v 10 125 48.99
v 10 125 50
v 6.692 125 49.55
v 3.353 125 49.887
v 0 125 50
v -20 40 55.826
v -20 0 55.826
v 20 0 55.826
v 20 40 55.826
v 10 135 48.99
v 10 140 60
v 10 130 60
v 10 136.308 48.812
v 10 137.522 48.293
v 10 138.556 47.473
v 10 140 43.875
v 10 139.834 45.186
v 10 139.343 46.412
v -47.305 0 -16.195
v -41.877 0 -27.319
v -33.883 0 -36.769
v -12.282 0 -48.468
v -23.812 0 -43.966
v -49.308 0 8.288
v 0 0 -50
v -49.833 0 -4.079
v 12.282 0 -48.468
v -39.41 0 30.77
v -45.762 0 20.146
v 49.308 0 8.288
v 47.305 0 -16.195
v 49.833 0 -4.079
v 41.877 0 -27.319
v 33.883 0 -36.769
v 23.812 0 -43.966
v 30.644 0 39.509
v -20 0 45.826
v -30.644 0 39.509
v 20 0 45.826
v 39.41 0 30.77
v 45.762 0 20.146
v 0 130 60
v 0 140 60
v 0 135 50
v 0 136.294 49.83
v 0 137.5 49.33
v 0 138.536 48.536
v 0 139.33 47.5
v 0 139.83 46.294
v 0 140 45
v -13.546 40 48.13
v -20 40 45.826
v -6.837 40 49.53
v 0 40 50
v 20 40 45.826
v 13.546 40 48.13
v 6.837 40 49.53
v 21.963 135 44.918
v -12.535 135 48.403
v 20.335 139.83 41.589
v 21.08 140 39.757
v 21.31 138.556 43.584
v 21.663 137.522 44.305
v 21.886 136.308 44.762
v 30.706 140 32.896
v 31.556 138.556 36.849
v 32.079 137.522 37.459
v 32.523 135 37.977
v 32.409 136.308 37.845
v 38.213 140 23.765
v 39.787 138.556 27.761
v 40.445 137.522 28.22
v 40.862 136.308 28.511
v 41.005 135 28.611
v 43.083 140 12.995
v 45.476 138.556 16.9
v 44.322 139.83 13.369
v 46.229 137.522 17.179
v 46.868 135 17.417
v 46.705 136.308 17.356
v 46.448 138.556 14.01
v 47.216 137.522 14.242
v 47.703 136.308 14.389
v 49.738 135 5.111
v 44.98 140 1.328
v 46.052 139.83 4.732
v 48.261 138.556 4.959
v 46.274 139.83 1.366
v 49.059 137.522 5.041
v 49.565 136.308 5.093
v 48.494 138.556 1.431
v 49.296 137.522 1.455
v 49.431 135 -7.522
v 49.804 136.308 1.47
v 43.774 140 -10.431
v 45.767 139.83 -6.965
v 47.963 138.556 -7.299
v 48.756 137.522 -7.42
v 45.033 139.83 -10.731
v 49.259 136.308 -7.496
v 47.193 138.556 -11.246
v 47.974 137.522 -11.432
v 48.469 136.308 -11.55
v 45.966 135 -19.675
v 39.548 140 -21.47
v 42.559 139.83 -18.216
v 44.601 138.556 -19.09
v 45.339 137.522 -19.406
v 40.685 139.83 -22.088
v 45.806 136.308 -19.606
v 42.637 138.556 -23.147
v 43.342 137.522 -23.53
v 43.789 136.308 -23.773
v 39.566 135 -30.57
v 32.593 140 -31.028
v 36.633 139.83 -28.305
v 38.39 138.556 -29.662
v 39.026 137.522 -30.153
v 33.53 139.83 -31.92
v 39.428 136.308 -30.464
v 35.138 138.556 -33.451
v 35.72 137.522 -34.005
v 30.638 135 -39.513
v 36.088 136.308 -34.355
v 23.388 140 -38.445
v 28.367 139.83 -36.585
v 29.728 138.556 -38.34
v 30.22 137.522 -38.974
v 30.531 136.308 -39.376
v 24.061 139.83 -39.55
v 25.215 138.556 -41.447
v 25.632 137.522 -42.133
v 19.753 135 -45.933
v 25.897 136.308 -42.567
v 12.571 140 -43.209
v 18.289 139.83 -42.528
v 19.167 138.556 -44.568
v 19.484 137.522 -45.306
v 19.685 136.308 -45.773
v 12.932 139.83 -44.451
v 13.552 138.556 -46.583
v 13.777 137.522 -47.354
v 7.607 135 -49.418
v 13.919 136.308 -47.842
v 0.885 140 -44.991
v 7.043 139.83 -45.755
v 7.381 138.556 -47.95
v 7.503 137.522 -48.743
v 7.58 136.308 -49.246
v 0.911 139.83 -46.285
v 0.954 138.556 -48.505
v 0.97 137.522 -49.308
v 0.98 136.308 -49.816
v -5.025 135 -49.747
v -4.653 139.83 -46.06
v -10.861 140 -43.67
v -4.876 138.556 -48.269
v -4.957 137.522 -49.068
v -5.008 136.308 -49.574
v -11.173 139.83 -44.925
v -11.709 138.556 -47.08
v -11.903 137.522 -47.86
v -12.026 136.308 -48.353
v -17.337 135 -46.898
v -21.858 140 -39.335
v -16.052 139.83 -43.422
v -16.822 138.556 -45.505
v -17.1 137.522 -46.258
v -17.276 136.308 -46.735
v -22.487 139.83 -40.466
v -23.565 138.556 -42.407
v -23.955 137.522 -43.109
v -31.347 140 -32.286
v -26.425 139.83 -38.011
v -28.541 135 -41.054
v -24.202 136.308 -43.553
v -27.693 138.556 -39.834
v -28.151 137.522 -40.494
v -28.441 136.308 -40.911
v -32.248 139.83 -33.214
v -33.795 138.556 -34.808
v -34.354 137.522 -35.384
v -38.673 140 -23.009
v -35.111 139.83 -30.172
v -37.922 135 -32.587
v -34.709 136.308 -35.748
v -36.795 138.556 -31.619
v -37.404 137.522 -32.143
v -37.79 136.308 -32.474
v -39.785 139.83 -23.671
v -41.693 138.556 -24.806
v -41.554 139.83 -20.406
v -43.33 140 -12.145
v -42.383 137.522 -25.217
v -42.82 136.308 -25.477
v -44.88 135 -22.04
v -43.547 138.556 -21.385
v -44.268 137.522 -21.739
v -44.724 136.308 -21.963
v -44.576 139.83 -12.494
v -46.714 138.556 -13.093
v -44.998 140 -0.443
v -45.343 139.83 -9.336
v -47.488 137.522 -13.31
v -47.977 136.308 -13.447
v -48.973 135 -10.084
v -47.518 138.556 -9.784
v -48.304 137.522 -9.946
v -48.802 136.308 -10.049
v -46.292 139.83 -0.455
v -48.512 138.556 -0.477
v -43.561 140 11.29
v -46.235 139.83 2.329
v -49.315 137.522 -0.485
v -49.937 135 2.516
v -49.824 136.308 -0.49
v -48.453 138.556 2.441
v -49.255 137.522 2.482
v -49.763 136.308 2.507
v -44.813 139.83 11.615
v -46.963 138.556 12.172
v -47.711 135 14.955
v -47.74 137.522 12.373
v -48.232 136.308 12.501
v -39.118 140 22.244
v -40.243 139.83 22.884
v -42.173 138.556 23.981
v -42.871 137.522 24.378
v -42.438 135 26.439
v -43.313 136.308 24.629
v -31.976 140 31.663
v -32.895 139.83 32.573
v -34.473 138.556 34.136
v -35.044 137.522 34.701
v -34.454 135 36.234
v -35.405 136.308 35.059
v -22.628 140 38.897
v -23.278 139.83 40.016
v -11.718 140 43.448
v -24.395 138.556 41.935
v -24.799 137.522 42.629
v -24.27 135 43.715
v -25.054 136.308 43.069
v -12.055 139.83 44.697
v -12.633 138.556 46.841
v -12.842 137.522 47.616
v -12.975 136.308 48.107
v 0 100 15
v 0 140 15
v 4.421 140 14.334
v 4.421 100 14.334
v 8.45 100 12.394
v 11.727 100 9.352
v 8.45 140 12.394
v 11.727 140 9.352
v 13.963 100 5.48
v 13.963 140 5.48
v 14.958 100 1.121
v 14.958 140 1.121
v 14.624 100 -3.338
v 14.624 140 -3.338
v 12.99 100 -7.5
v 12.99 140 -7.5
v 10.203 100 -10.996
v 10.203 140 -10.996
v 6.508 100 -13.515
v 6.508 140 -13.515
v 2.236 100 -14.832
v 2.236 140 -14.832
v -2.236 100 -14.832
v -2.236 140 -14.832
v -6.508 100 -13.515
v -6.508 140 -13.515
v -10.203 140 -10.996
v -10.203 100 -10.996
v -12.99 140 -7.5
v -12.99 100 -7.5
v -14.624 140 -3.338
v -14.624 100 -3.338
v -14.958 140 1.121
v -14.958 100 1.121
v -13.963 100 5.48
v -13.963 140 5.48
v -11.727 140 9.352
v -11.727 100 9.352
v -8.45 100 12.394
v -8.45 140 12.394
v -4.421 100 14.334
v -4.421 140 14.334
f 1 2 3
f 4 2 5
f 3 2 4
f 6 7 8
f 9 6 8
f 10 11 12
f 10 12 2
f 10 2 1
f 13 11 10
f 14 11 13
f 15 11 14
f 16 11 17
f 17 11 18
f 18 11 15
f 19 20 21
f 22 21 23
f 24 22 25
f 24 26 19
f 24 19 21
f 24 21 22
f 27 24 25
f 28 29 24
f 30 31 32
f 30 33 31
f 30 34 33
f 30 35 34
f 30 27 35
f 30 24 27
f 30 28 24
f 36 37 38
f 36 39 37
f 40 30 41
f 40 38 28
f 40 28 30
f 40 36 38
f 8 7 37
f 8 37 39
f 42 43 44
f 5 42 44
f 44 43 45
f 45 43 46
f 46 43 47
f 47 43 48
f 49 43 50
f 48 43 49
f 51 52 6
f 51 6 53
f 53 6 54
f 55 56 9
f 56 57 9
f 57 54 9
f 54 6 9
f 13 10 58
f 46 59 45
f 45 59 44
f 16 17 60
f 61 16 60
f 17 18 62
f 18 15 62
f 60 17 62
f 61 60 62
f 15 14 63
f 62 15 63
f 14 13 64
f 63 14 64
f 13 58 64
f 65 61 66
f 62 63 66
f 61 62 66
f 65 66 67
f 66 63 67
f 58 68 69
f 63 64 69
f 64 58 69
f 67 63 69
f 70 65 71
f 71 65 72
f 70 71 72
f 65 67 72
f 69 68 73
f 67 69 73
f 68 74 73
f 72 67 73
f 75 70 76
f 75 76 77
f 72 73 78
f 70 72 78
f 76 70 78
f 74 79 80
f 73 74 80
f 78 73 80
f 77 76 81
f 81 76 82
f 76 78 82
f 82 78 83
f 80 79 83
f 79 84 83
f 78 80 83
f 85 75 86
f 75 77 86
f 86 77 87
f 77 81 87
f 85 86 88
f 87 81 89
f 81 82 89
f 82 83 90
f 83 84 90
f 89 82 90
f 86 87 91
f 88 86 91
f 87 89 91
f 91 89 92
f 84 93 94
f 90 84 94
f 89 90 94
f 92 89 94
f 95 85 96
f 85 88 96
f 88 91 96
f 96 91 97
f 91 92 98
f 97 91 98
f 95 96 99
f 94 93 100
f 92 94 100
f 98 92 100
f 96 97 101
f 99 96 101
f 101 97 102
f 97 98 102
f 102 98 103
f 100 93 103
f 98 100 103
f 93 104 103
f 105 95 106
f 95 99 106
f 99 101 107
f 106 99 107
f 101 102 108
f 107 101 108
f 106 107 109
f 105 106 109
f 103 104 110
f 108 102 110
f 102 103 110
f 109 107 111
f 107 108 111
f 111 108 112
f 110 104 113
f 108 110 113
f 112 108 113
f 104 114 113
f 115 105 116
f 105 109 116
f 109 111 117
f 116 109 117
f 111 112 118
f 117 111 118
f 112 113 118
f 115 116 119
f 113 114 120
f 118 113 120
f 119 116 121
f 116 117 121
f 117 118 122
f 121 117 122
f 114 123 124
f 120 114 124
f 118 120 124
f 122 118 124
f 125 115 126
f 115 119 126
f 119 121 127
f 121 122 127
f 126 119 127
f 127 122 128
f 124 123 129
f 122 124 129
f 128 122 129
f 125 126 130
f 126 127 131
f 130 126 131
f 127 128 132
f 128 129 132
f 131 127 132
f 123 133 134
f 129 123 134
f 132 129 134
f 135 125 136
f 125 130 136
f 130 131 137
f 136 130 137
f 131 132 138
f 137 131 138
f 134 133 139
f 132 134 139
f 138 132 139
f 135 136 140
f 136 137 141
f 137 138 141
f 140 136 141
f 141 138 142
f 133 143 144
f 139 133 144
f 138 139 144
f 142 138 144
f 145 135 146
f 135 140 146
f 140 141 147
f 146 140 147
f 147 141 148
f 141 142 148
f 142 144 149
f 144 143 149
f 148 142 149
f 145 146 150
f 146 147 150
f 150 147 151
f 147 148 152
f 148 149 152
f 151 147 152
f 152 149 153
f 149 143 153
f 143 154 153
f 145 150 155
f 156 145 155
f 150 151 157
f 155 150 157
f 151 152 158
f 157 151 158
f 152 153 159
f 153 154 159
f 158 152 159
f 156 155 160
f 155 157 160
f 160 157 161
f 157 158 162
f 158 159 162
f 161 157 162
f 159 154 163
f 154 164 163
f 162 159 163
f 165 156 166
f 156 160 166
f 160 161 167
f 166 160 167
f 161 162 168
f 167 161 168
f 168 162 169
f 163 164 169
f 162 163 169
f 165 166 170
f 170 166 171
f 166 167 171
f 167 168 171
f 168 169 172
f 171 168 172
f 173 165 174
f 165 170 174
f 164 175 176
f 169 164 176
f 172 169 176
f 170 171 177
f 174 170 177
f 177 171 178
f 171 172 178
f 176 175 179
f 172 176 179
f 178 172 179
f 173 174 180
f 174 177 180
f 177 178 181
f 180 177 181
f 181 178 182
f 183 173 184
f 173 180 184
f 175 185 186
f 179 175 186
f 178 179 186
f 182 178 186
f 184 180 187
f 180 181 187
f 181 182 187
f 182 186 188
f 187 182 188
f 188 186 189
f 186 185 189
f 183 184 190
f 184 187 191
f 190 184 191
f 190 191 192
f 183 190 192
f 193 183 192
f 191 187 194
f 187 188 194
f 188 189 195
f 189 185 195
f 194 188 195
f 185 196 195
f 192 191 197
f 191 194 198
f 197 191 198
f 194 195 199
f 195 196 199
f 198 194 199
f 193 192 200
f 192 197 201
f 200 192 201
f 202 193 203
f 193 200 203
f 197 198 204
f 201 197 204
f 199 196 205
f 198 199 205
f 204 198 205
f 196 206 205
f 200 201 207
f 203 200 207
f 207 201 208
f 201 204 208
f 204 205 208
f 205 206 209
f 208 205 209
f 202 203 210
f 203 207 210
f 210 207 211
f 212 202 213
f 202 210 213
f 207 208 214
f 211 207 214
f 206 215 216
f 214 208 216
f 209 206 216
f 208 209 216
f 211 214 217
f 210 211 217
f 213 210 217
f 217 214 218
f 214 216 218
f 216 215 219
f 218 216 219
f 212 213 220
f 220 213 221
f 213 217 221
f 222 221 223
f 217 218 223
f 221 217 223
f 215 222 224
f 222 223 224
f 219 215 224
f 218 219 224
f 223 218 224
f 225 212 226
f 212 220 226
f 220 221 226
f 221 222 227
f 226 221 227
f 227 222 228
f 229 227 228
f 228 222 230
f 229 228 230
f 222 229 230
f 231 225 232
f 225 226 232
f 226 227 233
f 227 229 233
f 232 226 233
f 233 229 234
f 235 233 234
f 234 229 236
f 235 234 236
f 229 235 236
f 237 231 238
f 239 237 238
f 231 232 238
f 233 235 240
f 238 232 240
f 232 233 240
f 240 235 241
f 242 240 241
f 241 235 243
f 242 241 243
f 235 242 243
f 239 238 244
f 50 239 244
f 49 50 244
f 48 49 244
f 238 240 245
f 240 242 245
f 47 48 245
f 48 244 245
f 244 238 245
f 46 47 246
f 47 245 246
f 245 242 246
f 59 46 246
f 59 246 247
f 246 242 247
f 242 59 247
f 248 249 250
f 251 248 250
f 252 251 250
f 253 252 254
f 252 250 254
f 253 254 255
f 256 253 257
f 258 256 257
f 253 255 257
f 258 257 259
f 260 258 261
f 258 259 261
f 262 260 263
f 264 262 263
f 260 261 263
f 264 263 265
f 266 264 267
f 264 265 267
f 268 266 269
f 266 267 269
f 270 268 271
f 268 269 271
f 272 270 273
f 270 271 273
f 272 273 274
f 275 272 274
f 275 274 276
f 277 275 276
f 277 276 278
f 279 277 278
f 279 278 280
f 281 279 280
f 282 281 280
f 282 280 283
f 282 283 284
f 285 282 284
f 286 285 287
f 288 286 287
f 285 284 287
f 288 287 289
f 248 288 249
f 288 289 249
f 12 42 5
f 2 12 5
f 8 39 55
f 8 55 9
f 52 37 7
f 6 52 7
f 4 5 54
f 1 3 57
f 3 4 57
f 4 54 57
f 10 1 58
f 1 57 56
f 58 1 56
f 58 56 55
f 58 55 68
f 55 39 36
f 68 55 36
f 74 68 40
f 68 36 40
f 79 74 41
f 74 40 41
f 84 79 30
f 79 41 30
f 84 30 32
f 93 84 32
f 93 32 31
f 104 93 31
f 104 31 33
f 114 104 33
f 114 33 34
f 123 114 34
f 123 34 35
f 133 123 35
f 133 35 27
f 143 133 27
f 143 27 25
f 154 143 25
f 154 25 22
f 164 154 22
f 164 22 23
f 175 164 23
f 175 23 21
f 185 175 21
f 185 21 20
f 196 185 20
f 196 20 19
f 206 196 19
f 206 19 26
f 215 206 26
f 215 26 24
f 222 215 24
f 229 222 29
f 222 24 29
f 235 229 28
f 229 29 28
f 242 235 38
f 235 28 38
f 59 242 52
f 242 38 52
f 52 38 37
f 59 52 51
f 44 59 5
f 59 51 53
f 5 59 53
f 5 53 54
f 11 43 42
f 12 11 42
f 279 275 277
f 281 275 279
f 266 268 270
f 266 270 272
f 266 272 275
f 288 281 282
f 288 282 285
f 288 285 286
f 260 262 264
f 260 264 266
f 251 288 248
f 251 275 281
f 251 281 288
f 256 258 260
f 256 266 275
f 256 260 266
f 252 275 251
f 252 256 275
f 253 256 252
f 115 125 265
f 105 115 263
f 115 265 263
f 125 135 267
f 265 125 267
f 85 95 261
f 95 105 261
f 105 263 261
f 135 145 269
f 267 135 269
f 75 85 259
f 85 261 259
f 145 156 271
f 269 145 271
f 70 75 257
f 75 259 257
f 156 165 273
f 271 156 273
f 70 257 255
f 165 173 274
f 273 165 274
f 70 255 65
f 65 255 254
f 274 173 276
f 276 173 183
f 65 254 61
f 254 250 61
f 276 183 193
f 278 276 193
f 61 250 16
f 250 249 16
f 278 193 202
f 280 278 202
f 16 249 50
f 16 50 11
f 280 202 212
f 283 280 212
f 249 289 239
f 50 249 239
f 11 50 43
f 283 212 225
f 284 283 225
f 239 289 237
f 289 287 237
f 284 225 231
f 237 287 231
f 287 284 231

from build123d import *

# Parameters (mm, degrees)
SKETCH_1_R          = 50
EXTRUDE_1_DEPTH     = 140
SKETCH_2_W          = 40
SKETCH_2_H          = 10
EXTRUDE_2_DEPTH     = 40
SKETCH_3_R          = 15
CUT_EXTRUDE_1_DEPTH = 40
EXTRUDE_4_DEPTH     = 10
FILLET_2_R          = 5


with BuildPart() as part:
    # 草圖1 → 填料-伸長1 (new body)
    with BuildSketch(Plane(origin=(0, 0, 0), x_dir=(1, 0, 0), z_dir=(0, 1, 0))):
        with Locations(Location((0, 0, 0), (0, 0, 270))):
            Circle(SKETCH_1_R)
    extrude(amount=EXTRUDE_1_DEPTH)

    # 草圖2 → 填料-伸長2 (add)
    with BuildSketch(Plane.XZ):
        with Locations((0, 50.82575695)):
            Rectangle(SKETCH_2_W, SKETCH_2_H)
    extrude(amount=-EXTRUDE_2_DEPTH)

    # 草圖3 → 除料-伸長1 (cut)
    with BuildSketch(Plane(origin=(0, 140, 0), x_dir=(1, 0, 0), z_dir=(0, 1, 0))):
        with Locations(Location((0, 0, 0), (0, 0, 270))):
            Circle(SKETCH_3_R)
    extrude(amount=-CUT_EXTRUDE_1_DEPTH, mode=Mode.SUBTRACT)

    # 草圖4 → 填料-伸長4 (add)
    with BuildSketch(Plane(origin=(0, 0, 0), x_dir=(0, 0, -1), z_dir=(1, 0, 0))):
        Polygon((-50, 140), (-60, 140), (-60, 130), (-50, 125), (-44.587553404, 125), (-44.587553404, 140), align=None)
    extrude(amount=EXTRUDE_4_DEPTH)

    # 圓角2
    fillet_2_edges = [part.edges().sort_by_distance(p)[0] for p in [
        (-5.0254481, 140, -49.74680765),
    ]]
    fillet(fillet_2_edges, radius=FILLET_2_R)


solid = part.part
